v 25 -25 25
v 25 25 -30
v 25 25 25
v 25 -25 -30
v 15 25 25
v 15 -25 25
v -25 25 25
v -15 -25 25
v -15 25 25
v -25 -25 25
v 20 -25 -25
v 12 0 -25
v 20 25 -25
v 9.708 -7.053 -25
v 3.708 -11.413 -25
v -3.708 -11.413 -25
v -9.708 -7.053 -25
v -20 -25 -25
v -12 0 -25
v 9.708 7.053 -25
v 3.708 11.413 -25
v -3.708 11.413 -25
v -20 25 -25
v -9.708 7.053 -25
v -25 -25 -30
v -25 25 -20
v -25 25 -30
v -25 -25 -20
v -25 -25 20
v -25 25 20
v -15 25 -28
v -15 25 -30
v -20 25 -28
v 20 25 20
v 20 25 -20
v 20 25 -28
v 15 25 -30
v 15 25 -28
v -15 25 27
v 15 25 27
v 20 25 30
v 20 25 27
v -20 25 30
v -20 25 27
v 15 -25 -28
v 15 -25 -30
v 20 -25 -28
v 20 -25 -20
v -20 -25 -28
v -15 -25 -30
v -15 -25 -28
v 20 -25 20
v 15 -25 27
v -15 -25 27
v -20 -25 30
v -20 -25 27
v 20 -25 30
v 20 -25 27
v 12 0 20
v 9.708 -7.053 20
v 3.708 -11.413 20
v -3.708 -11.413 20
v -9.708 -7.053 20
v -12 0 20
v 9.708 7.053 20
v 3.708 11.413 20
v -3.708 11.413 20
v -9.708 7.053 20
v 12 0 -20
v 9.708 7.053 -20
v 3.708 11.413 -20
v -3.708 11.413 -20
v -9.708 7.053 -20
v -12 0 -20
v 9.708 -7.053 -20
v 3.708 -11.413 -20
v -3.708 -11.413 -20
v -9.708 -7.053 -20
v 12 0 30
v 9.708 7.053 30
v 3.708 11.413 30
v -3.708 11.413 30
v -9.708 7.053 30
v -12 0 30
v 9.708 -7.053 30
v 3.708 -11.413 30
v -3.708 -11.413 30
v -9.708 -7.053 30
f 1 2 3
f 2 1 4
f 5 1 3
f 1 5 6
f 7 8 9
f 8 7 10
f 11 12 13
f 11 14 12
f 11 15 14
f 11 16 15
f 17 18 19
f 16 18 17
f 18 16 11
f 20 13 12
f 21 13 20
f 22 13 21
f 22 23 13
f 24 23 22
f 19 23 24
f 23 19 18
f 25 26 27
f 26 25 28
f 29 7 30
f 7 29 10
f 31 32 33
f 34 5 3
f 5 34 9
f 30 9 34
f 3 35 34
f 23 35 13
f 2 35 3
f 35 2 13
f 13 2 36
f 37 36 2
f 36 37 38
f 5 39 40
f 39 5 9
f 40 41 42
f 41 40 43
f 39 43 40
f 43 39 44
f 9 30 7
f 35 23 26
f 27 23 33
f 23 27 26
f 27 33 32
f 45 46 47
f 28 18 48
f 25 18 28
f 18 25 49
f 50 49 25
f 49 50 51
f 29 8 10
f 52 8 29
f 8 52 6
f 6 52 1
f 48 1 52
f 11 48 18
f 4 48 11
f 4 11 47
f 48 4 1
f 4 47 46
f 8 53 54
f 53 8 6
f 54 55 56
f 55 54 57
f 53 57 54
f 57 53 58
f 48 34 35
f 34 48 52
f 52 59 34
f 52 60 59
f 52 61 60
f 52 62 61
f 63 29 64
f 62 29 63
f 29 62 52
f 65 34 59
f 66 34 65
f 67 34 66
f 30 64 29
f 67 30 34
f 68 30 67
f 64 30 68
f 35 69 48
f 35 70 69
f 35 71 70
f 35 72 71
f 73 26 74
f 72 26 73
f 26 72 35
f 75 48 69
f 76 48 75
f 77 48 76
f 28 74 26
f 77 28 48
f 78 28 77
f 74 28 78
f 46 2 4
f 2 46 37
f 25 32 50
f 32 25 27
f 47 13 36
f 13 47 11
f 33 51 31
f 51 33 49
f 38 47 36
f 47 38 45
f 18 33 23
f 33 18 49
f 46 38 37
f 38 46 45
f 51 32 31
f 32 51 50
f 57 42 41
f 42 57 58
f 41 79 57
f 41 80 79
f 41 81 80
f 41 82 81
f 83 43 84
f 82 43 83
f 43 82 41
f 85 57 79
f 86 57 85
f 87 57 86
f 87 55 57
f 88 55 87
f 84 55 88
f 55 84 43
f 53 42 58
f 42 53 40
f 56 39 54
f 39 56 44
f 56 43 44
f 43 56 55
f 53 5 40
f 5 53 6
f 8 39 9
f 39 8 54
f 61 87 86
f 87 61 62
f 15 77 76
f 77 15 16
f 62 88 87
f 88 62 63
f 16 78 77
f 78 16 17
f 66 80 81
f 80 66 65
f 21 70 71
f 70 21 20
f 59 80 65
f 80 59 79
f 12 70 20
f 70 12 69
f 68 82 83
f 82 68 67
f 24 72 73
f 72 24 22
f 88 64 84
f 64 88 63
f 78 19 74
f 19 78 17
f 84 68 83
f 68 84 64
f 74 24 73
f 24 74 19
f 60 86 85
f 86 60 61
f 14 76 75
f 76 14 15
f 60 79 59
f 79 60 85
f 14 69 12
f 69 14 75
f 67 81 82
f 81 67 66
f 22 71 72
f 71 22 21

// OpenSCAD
module guding(){
    difference(){
        cube([50,50,50]);
        translate([-0.5,-0.5,5])
        cube([45.5,51,40]);
    }
    difference(){
        translate([0,0,-5])
        cube([50,50,5]);
        translate([5,-0.5,-3])
        cube([40,51,3]);
        translate([10,-0.5,-5.6])
        cube([30,51,3]);
    }
    {
        translate([5,0,52])
        cube([40,50,3]);
        translate([10,0,50])
        cube([30,50,2]);
    }
}
translate([-25,-25,-25])
difference(){
    guding();
    translate([25,25,26])
    cylinder(h=60,r=12,center=true,$fn=10);
}
